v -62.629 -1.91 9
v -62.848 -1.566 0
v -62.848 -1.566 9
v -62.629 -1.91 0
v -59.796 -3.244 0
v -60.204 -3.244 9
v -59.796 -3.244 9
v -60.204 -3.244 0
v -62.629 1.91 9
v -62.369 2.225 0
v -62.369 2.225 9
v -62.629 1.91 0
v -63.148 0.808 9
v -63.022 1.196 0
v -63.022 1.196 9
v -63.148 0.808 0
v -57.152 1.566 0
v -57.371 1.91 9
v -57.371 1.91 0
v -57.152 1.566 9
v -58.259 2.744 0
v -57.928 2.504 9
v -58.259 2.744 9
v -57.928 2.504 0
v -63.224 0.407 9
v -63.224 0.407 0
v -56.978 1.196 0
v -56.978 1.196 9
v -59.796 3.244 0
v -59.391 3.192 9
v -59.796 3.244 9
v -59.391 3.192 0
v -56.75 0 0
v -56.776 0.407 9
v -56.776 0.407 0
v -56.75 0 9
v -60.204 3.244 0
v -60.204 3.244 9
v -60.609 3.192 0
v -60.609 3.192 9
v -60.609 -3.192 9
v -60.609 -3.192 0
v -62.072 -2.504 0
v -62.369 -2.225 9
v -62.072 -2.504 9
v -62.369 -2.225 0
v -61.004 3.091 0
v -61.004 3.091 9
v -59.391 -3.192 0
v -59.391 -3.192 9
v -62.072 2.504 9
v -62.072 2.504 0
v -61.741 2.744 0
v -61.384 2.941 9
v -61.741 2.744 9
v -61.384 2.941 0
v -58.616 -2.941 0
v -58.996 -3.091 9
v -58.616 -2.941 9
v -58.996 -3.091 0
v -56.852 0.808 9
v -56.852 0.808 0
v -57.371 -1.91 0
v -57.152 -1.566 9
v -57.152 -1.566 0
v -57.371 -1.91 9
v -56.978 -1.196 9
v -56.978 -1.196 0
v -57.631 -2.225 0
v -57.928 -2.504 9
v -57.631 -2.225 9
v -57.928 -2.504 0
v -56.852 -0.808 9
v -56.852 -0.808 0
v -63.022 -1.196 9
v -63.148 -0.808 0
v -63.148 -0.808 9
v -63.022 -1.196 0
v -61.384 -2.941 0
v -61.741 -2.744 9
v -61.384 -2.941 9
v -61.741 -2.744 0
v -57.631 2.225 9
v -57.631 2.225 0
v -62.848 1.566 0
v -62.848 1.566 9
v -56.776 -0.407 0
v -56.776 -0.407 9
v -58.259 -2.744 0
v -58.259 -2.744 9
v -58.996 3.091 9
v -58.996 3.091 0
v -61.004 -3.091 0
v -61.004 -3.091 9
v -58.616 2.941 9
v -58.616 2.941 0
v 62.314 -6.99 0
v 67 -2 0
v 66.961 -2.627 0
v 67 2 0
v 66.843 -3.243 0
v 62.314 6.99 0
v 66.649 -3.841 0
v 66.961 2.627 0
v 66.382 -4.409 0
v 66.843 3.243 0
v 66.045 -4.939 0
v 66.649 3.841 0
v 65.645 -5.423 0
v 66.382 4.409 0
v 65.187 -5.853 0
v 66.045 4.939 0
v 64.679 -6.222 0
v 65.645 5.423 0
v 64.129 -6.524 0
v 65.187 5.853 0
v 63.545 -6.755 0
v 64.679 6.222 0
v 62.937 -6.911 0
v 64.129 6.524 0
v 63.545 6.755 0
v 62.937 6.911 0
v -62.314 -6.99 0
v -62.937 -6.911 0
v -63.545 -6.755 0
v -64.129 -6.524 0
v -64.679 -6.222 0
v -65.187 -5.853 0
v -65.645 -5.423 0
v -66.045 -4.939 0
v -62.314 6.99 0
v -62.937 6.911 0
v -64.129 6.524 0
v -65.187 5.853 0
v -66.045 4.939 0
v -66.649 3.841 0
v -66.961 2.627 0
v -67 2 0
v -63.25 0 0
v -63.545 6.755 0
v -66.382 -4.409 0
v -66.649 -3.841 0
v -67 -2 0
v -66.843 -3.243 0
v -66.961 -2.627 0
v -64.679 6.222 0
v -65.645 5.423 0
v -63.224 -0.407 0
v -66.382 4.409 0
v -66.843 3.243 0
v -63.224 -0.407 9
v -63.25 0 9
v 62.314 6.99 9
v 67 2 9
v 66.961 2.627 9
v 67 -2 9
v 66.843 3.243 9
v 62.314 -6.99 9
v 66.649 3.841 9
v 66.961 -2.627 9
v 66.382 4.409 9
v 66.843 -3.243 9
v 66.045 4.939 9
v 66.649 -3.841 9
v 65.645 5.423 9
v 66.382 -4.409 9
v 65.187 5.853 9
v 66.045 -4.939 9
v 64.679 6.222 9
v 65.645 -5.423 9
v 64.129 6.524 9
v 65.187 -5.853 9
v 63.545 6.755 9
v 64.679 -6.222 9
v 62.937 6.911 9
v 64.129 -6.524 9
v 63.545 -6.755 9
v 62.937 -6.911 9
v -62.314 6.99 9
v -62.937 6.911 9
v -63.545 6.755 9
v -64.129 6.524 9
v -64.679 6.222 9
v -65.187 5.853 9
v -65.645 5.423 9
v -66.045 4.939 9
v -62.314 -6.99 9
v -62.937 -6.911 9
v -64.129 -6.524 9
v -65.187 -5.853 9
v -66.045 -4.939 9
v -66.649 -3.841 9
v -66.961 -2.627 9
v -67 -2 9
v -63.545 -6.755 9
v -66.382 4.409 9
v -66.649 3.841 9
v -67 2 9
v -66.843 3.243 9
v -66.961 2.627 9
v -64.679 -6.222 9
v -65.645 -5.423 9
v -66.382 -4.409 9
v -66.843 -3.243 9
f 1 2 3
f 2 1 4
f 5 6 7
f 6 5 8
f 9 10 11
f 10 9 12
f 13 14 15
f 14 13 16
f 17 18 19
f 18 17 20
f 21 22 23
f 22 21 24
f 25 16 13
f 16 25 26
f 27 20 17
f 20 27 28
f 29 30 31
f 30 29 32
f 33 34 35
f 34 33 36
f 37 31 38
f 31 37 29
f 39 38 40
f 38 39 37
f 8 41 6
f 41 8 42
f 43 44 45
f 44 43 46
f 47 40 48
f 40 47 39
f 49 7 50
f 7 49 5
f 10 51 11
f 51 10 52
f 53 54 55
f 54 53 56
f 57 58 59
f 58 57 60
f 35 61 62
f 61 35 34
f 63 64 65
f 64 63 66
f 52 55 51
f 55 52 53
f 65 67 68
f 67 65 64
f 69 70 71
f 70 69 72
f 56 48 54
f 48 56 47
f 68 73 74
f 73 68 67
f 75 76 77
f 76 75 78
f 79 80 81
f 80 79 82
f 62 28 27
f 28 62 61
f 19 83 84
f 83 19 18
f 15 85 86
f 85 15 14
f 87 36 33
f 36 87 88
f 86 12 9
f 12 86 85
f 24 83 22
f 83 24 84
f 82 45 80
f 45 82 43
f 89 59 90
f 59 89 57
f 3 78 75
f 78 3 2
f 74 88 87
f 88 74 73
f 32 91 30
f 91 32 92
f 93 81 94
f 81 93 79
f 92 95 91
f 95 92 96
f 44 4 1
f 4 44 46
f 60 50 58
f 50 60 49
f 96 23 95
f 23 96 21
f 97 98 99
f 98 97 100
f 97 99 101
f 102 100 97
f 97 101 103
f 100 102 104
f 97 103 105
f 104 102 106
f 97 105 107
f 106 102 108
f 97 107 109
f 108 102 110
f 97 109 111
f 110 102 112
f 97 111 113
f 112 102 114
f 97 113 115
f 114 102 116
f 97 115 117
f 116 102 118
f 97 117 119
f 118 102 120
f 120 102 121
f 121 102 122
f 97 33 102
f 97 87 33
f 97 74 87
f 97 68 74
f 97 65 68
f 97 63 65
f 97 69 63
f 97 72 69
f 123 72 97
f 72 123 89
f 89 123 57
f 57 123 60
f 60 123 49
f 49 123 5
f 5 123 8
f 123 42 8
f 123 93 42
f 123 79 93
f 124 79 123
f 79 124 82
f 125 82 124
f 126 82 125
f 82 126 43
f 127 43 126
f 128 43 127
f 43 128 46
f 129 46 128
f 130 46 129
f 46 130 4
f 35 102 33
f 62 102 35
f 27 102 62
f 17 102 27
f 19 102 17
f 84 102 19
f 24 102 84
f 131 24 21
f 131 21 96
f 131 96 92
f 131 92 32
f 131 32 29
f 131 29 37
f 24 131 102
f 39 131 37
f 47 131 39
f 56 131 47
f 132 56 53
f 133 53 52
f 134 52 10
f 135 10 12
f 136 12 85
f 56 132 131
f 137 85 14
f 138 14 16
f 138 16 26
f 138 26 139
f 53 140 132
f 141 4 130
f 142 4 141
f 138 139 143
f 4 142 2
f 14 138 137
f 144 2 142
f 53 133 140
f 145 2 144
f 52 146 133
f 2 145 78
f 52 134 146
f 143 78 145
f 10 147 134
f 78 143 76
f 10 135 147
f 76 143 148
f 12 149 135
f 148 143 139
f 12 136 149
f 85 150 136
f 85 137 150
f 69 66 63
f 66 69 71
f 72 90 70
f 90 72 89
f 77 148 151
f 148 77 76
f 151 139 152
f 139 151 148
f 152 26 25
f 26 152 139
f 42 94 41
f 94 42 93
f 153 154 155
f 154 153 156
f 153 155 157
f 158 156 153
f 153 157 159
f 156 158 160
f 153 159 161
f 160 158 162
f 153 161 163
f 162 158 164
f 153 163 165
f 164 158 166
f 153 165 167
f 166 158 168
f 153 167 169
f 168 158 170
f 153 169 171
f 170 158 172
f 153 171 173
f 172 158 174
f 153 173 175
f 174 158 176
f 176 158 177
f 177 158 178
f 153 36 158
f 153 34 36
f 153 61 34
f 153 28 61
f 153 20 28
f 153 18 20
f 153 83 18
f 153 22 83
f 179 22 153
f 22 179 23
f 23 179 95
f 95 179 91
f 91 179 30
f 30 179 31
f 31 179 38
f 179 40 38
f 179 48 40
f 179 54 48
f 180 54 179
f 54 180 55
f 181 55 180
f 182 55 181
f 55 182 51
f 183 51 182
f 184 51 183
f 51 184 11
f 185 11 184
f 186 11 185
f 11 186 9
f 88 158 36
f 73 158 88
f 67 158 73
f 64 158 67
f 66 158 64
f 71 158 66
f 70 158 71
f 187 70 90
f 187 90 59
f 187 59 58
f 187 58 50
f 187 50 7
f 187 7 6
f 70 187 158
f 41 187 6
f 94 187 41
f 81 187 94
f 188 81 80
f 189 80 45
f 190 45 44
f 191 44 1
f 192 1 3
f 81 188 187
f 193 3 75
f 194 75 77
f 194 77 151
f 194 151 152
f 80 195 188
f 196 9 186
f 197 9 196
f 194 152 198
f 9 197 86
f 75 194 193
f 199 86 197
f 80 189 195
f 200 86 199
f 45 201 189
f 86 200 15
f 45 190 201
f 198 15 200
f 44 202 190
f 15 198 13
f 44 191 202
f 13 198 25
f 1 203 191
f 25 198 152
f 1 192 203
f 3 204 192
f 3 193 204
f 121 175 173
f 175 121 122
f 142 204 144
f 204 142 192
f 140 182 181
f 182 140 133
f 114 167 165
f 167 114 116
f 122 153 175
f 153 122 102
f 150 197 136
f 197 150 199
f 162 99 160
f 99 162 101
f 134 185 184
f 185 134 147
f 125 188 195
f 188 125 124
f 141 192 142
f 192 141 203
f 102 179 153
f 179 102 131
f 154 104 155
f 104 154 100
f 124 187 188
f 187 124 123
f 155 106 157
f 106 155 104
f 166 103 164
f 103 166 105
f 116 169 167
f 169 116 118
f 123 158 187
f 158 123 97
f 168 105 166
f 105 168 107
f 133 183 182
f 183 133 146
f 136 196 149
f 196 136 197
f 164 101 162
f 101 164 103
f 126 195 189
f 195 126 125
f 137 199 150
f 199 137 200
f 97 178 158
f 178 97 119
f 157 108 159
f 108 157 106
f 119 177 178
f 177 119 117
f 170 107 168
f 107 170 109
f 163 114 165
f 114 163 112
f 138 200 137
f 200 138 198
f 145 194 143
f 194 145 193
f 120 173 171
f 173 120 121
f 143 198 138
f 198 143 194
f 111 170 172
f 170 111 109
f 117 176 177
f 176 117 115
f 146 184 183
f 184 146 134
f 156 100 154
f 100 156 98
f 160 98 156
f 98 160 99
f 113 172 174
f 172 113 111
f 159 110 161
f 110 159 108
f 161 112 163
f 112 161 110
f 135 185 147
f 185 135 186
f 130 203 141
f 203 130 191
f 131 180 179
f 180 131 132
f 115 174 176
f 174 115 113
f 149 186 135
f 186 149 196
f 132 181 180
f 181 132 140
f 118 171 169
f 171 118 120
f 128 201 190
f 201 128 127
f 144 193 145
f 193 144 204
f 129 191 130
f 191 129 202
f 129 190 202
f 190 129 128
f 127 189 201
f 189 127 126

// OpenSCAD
$fn = 50;


difference() {
	union() {
		hull() {
			translate(v = [-62.0000000000, 2.0000000000, 0]) {
				cylinder(h = 9, r = 5);
			}
			translate(v = [62.0000000000, 2.0000000000, 0]) {
				cylinder(h = 9, r = 5);
			}
			translate(v = [-62.0000000000, -2.0000000000, 0]) {
				cylinder(h = 9, r = 5);
			}
			translate(v = [62.0000000000, -2.0000000000, 0]) {
				cylinder(h = 9, r = 5);
			}
		}
	}
	union() {
		translate(v = [-60.0000000000, 0.0000000000, 0]) {
			cylinder(h = 9, r = 3.2500000000);
		}
		translate(v = [-60.0000000000, 0.0000000000, 0]) {
			cylinder(h = 9, r = 1.8000000000);
		}
		translate(v = [-60.0000000000, 0.0000000000, 0]) {
			cylinder(h = 9, r = 1.8000000000);
		}
		translate(v = [-60.0000000000, 0.0000000000, 0]) {
			cylinder(h = 9, r = 1.8000000000);
		}
	}
}
